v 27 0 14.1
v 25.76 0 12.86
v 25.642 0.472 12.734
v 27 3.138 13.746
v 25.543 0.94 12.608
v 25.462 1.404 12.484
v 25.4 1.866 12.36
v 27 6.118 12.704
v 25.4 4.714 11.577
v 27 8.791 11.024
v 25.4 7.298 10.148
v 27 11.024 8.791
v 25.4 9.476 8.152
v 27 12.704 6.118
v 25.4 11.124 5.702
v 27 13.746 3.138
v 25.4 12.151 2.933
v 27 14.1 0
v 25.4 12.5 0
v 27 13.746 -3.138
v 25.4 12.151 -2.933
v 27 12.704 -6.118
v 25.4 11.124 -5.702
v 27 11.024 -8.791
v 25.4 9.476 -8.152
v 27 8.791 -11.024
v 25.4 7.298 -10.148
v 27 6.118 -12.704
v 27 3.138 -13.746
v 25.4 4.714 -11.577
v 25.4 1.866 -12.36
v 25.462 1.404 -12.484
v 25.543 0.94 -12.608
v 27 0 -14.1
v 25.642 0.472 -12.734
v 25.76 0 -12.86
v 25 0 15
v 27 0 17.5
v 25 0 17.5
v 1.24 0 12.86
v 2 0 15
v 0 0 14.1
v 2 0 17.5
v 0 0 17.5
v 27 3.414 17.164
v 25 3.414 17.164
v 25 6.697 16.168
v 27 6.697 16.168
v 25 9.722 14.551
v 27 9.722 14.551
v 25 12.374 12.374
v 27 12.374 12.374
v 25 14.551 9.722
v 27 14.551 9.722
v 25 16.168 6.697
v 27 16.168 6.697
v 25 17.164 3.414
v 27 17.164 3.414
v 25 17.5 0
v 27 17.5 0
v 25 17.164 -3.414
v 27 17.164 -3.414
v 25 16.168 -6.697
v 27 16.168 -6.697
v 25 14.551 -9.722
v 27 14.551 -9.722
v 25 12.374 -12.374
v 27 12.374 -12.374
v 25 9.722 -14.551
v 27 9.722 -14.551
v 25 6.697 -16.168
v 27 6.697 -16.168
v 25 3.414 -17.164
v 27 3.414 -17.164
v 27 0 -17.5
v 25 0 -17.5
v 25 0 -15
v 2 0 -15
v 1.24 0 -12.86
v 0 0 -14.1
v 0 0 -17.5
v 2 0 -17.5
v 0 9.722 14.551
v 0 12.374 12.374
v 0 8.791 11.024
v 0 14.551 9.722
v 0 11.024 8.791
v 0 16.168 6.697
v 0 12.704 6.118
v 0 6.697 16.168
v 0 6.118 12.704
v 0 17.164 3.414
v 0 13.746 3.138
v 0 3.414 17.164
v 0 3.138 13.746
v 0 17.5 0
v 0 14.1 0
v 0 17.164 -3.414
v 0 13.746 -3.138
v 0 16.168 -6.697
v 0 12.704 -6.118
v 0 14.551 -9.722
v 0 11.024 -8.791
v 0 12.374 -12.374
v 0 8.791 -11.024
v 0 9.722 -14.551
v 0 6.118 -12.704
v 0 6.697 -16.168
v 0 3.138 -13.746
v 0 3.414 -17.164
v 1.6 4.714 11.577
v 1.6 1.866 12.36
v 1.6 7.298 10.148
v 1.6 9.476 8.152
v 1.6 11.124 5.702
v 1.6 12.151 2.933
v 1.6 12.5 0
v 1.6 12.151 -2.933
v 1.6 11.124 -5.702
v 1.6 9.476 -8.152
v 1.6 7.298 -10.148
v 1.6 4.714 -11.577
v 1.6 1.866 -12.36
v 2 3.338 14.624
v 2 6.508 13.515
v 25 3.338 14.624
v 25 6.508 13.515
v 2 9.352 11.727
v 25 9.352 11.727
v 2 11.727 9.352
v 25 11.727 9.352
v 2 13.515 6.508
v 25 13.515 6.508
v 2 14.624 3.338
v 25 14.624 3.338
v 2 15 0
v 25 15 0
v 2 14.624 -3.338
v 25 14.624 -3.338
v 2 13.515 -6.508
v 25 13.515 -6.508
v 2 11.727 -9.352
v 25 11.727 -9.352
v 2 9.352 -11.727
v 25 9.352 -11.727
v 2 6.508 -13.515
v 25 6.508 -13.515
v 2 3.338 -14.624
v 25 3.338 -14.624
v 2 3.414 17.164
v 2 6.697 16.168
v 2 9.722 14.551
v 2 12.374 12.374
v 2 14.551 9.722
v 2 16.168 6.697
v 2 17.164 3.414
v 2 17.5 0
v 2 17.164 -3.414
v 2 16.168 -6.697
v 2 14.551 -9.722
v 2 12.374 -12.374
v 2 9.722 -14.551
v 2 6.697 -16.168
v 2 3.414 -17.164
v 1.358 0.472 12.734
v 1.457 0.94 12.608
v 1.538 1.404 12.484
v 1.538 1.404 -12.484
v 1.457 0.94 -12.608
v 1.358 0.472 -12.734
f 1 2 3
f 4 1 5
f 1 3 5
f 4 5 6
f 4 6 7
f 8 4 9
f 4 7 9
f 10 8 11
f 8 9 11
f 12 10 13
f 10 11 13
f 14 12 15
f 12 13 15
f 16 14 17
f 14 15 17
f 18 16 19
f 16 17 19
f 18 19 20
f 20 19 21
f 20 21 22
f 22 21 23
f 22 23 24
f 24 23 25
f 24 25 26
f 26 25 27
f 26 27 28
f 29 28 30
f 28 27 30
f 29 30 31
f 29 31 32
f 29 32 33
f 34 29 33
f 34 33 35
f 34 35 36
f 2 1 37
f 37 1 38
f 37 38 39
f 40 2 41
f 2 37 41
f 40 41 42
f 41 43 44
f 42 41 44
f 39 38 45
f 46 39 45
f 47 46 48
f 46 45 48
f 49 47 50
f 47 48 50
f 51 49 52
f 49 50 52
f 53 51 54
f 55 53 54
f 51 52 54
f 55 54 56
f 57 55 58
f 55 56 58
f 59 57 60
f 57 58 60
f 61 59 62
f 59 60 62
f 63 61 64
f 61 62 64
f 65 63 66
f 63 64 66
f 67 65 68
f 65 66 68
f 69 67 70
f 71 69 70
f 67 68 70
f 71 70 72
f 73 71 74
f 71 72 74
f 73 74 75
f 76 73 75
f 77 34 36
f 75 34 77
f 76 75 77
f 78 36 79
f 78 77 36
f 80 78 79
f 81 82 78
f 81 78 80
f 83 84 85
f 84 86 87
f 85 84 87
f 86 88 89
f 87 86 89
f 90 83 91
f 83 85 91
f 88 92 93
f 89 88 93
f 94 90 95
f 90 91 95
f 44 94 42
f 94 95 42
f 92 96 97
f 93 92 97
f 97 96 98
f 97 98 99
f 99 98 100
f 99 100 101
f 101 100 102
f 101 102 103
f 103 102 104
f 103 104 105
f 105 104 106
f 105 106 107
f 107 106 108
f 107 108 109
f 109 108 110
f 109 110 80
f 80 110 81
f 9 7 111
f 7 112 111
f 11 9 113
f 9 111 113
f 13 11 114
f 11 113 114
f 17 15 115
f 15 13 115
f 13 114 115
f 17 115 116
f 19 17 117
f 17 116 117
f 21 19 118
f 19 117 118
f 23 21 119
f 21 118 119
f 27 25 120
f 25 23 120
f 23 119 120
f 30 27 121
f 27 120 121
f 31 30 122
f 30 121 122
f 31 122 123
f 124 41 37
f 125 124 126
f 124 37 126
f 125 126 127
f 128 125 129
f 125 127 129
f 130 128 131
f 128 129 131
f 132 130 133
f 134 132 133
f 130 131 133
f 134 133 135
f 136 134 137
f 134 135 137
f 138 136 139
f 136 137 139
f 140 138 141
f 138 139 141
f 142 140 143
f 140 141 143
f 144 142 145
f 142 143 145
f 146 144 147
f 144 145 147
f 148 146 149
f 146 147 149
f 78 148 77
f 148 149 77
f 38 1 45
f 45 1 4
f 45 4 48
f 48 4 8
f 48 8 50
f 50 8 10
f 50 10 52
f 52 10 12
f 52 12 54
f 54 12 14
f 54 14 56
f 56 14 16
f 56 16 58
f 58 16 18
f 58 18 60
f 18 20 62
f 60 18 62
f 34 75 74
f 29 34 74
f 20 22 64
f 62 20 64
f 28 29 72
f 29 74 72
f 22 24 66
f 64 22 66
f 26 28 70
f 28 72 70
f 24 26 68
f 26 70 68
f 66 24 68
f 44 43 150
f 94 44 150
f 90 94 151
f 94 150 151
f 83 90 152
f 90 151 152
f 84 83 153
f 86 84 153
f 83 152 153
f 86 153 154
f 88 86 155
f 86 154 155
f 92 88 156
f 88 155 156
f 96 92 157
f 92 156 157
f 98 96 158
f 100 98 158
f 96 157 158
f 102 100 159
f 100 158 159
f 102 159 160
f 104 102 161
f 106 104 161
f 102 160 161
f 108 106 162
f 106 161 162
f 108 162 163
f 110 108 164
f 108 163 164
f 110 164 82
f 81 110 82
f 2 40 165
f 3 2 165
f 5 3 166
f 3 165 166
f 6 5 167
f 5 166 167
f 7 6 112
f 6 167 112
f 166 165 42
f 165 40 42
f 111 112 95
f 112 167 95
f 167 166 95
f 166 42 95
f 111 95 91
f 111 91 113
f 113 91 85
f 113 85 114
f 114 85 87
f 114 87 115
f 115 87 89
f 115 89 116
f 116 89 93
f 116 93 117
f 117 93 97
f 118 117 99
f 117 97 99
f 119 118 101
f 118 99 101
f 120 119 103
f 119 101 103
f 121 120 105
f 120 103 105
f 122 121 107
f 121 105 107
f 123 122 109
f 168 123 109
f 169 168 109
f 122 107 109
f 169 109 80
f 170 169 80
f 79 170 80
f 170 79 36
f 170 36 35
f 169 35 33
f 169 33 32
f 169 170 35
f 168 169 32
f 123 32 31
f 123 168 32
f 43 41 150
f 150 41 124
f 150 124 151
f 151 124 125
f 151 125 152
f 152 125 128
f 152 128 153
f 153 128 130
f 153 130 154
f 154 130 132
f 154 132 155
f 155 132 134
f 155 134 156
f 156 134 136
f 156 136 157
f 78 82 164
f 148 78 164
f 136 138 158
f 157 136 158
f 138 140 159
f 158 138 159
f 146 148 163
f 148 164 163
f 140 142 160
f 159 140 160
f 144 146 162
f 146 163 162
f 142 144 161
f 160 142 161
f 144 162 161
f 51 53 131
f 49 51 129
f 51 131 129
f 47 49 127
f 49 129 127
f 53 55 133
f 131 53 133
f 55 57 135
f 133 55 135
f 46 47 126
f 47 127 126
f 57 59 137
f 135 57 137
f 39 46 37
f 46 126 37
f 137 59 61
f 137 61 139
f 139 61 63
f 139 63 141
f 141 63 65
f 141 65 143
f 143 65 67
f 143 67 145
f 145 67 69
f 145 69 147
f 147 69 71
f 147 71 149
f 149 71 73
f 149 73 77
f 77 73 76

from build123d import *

# Parameters (mm, degrees)
REVOLVE_1_ANGLE     = 180
CUT_EXTRUDE_1_DEPTH = 37.626493144


with BuildPart() as part:
    # Эскиз1 → Повернуть1 (revolve, symmetric)
    with BuildSketch(Plane.XY) as revolve_1_sk:
        Polygon((0, 14.1), (0, 17.5), (2, 17.5), (2, 15), (25, 15), (25, 17.5), (27, 17.5), (27, 14.1), (25.4, 12.5), (1.6, 12.5), align=None)
    revolve(axis=Axis((-27.195971024, 0, 0), (1, 0, 0)), revolution_arc=REVOLVE_1_ANGLE / 2)
    revolve(revolve_1_sk.sketch, axis=Axis((-27.195971024, 0, 0), (-1, 0, 0)), revolution_arc=REVOLVE_1_ANGLE / 2)

    # Эскиз2 → Вырез-Вытянуть1 (cut, through all)
    with BuildSketch(Plane.ZY):
        Polygon((12.85993322, 0), (12.35993322, 1.866025404), (12.35993322, 0), align=None)
        Polygon((-12.85993322, 0), (-12.35993322, 1.866025404), (-12.35993322, 0), align=None)
    extrude(amount=-CUT_EXTRUDE_1_DEPTH, mode=Mode.SUBTRACT)


solid = part.part
